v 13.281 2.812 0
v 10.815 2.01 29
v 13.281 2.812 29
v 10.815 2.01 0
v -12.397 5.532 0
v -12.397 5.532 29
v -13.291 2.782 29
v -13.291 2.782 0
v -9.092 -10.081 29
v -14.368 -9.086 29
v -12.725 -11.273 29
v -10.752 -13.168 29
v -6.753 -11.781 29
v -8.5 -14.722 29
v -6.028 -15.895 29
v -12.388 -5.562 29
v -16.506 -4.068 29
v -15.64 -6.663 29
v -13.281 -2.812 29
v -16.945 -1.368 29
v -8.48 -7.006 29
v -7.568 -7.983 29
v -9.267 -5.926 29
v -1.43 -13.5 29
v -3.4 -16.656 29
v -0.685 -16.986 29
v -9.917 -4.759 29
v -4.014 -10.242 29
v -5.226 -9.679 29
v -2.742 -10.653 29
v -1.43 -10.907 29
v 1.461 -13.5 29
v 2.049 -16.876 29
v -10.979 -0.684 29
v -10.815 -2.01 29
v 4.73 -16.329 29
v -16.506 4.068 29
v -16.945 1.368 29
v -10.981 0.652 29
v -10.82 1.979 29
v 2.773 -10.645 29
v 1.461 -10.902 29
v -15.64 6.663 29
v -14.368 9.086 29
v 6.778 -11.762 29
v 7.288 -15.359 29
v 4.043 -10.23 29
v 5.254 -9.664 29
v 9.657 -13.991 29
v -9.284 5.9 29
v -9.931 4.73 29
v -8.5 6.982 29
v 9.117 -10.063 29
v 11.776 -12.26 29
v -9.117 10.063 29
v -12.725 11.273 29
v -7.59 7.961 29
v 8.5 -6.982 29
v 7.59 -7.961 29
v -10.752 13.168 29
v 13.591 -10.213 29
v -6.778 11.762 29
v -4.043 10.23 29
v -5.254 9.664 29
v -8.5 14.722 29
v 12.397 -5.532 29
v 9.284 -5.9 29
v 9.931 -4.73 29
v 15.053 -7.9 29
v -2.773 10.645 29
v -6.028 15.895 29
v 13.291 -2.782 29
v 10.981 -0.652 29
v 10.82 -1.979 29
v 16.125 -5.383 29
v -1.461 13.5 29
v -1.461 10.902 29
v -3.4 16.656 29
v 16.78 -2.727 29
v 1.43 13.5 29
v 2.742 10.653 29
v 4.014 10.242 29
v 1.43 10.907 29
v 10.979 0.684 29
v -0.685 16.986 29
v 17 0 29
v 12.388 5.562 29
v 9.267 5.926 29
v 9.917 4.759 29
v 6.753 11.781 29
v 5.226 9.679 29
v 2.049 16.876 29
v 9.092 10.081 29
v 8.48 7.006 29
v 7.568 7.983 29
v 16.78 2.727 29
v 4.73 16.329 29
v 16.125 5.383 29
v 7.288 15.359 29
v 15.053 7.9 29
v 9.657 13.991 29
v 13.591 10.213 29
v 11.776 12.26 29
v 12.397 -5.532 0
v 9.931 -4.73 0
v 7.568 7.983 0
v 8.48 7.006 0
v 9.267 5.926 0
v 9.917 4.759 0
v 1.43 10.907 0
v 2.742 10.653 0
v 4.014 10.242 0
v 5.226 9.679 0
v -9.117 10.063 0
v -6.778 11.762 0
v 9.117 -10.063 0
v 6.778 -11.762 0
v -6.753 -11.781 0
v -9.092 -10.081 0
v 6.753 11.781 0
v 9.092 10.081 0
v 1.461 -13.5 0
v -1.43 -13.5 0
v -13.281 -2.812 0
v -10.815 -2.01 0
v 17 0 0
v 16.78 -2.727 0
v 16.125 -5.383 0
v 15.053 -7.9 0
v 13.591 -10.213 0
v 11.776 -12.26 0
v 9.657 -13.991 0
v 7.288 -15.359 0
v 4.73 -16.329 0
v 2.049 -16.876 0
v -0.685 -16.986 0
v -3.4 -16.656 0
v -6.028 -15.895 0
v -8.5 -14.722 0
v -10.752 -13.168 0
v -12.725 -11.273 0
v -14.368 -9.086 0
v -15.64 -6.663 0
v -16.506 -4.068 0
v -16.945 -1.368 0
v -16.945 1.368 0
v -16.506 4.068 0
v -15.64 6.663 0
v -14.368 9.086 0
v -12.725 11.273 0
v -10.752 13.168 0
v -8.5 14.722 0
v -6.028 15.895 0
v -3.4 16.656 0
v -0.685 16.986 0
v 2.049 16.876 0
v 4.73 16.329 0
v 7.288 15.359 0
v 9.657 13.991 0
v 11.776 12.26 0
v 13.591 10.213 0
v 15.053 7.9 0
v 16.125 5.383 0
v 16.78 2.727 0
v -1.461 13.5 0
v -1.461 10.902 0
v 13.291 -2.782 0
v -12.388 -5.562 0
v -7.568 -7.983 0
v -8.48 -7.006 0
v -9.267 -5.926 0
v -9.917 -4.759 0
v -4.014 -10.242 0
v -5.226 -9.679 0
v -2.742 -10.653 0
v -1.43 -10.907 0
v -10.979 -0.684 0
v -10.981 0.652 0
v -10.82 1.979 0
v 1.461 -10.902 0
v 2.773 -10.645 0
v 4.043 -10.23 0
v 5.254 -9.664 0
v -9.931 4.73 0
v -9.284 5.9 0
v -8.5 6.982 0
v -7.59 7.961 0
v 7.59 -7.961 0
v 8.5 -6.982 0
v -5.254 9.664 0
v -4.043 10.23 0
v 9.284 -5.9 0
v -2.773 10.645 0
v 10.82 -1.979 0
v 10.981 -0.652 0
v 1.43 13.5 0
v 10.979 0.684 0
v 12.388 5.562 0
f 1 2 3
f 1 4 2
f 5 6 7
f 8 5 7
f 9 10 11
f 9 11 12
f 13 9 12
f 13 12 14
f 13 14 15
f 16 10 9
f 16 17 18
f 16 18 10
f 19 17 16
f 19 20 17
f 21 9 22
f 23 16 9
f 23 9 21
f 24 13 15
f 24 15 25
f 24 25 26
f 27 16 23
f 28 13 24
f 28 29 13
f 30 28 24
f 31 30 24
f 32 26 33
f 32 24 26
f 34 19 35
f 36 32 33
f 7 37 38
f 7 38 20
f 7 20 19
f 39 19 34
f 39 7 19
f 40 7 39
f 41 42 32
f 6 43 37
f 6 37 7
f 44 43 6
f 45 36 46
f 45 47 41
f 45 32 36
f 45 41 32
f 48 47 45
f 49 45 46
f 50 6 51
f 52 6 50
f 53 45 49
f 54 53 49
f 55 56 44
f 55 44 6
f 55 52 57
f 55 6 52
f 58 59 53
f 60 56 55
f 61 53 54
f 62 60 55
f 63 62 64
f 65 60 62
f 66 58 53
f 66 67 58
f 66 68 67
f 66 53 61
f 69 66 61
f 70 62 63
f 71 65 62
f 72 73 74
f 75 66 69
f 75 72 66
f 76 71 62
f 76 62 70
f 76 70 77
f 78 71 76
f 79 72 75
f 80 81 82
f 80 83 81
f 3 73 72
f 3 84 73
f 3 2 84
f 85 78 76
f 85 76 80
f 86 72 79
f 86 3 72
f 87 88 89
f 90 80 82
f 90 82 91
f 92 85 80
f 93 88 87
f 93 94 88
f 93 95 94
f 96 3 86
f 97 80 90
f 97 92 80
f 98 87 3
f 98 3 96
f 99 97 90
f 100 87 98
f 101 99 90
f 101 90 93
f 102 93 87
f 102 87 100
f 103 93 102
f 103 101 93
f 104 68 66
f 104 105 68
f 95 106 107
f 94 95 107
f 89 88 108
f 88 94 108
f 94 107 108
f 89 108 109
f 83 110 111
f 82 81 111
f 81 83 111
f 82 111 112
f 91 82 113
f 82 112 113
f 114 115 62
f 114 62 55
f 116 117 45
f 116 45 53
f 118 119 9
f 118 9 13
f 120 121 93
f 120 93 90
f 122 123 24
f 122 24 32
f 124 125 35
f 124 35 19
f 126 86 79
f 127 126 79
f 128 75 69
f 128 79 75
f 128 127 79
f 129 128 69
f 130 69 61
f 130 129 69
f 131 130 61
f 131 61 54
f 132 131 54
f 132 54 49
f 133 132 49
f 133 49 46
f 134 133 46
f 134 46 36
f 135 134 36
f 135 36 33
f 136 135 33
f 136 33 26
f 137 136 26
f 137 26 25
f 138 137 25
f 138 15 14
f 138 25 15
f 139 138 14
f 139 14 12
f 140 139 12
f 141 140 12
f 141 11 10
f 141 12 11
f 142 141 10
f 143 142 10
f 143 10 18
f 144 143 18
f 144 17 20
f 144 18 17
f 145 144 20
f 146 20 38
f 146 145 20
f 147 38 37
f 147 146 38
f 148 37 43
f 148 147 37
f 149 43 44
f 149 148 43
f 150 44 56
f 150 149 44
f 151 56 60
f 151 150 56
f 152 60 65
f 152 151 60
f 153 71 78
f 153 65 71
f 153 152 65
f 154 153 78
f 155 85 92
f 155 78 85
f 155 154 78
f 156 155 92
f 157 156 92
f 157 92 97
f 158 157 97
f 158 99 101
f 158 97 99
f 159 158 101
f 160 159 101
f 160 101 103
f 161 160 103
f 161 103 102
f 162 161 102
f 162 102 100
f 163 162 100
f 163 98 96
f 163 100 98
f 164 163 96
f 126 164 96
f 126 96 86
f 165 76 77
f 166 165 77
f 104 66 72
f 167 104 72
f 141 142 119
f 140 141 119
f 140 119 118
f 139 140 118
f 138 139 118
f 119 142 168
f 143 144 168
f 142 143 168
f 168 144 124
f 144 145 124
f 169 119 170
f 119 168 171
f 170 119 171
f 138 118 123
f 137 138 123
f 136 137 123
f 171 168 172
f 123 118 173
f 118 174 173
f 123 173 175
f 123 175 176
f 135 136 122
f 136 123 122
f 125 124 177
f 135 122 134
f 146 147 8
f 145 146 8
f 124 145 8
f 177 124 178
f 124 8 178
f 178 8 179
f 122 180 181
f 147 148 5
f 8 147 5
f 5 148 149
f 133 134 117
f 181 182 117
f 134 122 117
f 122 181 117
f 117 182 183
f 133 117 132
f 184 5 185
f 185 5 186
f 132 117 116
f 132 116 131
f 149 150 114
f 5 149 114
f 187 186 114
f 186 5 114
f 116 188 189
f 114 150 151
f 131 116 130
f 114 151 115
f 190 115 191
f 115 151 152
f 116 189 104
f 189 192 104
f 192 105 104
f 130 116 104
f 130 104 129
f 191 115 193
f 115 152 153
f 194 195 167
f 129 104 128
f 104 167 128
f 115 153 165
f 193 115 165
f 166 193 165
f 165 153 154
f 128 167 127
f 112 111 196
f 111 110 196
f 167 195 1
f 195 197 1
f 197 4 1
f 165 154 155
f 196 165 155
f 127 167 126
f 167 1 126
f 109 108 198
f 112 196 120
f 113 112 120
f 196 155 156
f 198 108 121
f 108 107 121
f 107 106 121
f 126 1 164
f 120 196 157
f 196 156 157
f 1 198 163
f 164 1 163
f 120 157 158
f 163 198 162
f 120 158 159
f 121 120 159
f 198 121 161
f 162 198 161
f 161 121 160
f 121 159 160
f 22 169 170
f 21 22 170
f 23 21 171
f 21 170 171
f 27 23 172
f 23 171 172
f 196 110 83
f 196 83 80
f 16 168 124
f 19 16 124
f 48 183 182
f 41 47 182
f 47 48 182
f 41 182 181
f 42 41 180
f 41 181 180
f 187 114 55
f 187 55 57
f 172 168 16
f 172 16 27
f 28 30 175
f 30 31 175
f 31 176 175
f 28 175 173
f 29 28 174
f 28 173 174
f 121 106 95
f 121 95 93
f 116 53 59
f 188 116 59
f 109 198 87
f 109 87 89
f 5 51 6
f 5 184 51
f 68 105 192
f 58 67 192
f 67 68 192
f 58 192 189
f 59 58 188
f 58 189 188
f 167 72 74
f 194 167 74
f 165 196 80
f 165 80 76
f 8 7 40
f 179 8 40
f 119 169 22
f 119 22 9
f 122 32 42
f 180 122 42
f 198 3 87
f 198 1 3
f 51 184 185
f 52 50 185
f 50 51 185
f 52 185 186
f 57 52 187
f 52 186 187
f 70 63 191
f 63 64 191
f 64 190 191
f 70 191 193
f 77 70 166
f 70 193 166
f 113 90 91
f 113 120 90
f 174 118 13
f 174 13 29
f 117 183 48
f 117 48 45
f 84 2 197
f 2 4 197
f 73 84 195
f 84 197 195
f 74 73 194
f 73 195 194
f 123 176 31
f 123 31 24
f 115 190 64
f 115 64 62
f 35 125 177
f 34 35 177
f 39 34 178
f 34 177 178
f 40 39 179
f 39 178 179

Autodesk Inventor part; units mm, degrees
ref_plane "YZ Plane" through (0, 0, 0) normal (1, 0, 0) x (0, 1, 0)
ref_plane "XZ Plane" through (0, 0, 0) normal (0, 1, 0) x (-1, 0, 0)
ref_plane "XY Plane" through (0, 0, 0) normal (0, 0, 1) x (1, 0, 0)
sketch "Sketch1" plane through (0, 0, 0) normal (0, 0, 1) x (1, 0, 0)
  arc A0 (-10.8205, 1.9793) -> (-10.8147, -2.0103) centre (0, 0) ccw
  line L0 (-10.8147, -2.0103) -> (-13.2812, -2.8117)
  line L1 (-12.3877, -5.5615) -> (-13.2812, -2.8117)
  line L2 (-13.2812, -2.8117) -> (-12.3877, -5.5615)
  line L3 (-12.3877, -5.5615) -> (-9.9173, -4.7588)
  line L4 (-12.3974, 5.5317) -> (-13.2908, 2.782)
  line L5 (-13.2908, 2.782) -> (-10.8205, 1.9793)
  line L6 (-9.931, 4.7303) -> (-12.3974, 5.5317)
  arc A1 (-7.5905, 7.9614) -> (-9.931, 4.7303) centre (0, 0) ccw
  line L7 (-6.7782, 11.7623) -> (-9.1173, 10.0628)
  line L8 (-9.1173, 10.0628) -> (-7.5905, 7.9614)
  line L9 (-5.2539, 9.6642) -> (-6.7782, 11.7623)
  arc A2 (-1.4613, 10.9025) -> (-5.2539, 9.6642) centre (0, 0) ccw
  line L10 (1.43, 13.5) -> (-1.4613, 13.5)
  line L11 (-1.4613, 13.5) -> (-1.4613, 10.9025)
  line L12 (1.43, 10.9067) -> (1.43, 13.5)
  arc A3 (5.2261, 9.6792) -> (1.43, 10.9067) centre (0, 0) ccw
  line L13 (9.092, 10.0812) -> (6.7529, 11.7806)
  line L14 (6.7529, 11.7806) -> (5.2261, 9.6792)
  line L15 (7.5677, 7.9831) -> (9.092, 10.0812)
  arc A4 (9.9173, 4.7588) -> (7.5677, 7.9831) centre (0, 0) ccw
  line L16 (13.2812, 2.8117) -> (12.3877, 5.5615)
  line L17 (12.3877, 5.5615) -> (9.9173, 4.7588)
  line L18 (10.8147, 2.0103) -> (13.2812, 2.8117)
  arc A5 (10.8205, -1.9793) -> (10.8147, 2.0103) centre (0, 0) ccw
  line L19 (12.3974, -5.5317) -> (13.2908, -2.782)
  line L20 (13.2908, -2.782) -> (10.8205, -1.9793)
  line L21 (9.931, -4.7303) -> (12.3974, -5.5317)
  arc A6 (7.5905, -7.9614) -> (9.931, -4.7303) centre (0, 0) ccw
  line L22 (6.7782, -11.7623) -> (9.1173, -10.0628)
  line L23 (9.1173, -10.0628) -> (7.5905, -7.9614)
  line L24 (5.2539, -9.6642) -> (6.7782, -11.7623)
  arc A7 (1.4613, -10.9025) -> (5.2539, -9.6642) centre (0, 0) ccw
  line L25 (-1.43, -13.5) -> (1.4613, -13.5)
  line L26 (1.4613, -13.5) -> (1.4613, -10.9025)
  line L27 (-1.43, -10.9067) -> (-1.43, -13.5)
  arc A8 (-5.2261, -9.6792) -> (-1.43, -10.9067) centre (0, 0) ccw
  line L28 (-9.092, -10.0812) -> (-6.7529, -11.7806)
  line L29 (-6.7529, -11.7806) -> (-5.2261, -9.6792)
  line L30 (-7.5677, -7.9831) -> (-9.092, -10.0812)
  arc A9 (-9.9173, -4.7588) -> (-7.5677, -7.9831) centre (0, 0) ccw
  circle A10 centre (0, 0) radius 17
  circle A11 centre (0, 0) radius 8.5
  point P0 (-10.8205, 1.9793)
  point P1 (-7.5905, 7.9614)
  point P2 (5.2261, 9.6792)
  point P3 (9.9173, 4.7588)
  point P4 (10.8205, -1.9793)
  point P5 (7.5905, -7.9614)
  point P6 (1.4613, -10.9025)
  point P7 (-5.2261, -9.6792)
  point P8 (-9.9173, -4.7588)
  dimension "d2" = 360
  dimension "d3" = 34
  dimension "d6" = 11
  dimension "d7" = 17
  dimension "d8" = 2.5933
  dimension "d9" = 2.8912
extrude "Extrusion1" add sketch "Sketch1" along normal blind 29 contours A10
properties part number "opona"
